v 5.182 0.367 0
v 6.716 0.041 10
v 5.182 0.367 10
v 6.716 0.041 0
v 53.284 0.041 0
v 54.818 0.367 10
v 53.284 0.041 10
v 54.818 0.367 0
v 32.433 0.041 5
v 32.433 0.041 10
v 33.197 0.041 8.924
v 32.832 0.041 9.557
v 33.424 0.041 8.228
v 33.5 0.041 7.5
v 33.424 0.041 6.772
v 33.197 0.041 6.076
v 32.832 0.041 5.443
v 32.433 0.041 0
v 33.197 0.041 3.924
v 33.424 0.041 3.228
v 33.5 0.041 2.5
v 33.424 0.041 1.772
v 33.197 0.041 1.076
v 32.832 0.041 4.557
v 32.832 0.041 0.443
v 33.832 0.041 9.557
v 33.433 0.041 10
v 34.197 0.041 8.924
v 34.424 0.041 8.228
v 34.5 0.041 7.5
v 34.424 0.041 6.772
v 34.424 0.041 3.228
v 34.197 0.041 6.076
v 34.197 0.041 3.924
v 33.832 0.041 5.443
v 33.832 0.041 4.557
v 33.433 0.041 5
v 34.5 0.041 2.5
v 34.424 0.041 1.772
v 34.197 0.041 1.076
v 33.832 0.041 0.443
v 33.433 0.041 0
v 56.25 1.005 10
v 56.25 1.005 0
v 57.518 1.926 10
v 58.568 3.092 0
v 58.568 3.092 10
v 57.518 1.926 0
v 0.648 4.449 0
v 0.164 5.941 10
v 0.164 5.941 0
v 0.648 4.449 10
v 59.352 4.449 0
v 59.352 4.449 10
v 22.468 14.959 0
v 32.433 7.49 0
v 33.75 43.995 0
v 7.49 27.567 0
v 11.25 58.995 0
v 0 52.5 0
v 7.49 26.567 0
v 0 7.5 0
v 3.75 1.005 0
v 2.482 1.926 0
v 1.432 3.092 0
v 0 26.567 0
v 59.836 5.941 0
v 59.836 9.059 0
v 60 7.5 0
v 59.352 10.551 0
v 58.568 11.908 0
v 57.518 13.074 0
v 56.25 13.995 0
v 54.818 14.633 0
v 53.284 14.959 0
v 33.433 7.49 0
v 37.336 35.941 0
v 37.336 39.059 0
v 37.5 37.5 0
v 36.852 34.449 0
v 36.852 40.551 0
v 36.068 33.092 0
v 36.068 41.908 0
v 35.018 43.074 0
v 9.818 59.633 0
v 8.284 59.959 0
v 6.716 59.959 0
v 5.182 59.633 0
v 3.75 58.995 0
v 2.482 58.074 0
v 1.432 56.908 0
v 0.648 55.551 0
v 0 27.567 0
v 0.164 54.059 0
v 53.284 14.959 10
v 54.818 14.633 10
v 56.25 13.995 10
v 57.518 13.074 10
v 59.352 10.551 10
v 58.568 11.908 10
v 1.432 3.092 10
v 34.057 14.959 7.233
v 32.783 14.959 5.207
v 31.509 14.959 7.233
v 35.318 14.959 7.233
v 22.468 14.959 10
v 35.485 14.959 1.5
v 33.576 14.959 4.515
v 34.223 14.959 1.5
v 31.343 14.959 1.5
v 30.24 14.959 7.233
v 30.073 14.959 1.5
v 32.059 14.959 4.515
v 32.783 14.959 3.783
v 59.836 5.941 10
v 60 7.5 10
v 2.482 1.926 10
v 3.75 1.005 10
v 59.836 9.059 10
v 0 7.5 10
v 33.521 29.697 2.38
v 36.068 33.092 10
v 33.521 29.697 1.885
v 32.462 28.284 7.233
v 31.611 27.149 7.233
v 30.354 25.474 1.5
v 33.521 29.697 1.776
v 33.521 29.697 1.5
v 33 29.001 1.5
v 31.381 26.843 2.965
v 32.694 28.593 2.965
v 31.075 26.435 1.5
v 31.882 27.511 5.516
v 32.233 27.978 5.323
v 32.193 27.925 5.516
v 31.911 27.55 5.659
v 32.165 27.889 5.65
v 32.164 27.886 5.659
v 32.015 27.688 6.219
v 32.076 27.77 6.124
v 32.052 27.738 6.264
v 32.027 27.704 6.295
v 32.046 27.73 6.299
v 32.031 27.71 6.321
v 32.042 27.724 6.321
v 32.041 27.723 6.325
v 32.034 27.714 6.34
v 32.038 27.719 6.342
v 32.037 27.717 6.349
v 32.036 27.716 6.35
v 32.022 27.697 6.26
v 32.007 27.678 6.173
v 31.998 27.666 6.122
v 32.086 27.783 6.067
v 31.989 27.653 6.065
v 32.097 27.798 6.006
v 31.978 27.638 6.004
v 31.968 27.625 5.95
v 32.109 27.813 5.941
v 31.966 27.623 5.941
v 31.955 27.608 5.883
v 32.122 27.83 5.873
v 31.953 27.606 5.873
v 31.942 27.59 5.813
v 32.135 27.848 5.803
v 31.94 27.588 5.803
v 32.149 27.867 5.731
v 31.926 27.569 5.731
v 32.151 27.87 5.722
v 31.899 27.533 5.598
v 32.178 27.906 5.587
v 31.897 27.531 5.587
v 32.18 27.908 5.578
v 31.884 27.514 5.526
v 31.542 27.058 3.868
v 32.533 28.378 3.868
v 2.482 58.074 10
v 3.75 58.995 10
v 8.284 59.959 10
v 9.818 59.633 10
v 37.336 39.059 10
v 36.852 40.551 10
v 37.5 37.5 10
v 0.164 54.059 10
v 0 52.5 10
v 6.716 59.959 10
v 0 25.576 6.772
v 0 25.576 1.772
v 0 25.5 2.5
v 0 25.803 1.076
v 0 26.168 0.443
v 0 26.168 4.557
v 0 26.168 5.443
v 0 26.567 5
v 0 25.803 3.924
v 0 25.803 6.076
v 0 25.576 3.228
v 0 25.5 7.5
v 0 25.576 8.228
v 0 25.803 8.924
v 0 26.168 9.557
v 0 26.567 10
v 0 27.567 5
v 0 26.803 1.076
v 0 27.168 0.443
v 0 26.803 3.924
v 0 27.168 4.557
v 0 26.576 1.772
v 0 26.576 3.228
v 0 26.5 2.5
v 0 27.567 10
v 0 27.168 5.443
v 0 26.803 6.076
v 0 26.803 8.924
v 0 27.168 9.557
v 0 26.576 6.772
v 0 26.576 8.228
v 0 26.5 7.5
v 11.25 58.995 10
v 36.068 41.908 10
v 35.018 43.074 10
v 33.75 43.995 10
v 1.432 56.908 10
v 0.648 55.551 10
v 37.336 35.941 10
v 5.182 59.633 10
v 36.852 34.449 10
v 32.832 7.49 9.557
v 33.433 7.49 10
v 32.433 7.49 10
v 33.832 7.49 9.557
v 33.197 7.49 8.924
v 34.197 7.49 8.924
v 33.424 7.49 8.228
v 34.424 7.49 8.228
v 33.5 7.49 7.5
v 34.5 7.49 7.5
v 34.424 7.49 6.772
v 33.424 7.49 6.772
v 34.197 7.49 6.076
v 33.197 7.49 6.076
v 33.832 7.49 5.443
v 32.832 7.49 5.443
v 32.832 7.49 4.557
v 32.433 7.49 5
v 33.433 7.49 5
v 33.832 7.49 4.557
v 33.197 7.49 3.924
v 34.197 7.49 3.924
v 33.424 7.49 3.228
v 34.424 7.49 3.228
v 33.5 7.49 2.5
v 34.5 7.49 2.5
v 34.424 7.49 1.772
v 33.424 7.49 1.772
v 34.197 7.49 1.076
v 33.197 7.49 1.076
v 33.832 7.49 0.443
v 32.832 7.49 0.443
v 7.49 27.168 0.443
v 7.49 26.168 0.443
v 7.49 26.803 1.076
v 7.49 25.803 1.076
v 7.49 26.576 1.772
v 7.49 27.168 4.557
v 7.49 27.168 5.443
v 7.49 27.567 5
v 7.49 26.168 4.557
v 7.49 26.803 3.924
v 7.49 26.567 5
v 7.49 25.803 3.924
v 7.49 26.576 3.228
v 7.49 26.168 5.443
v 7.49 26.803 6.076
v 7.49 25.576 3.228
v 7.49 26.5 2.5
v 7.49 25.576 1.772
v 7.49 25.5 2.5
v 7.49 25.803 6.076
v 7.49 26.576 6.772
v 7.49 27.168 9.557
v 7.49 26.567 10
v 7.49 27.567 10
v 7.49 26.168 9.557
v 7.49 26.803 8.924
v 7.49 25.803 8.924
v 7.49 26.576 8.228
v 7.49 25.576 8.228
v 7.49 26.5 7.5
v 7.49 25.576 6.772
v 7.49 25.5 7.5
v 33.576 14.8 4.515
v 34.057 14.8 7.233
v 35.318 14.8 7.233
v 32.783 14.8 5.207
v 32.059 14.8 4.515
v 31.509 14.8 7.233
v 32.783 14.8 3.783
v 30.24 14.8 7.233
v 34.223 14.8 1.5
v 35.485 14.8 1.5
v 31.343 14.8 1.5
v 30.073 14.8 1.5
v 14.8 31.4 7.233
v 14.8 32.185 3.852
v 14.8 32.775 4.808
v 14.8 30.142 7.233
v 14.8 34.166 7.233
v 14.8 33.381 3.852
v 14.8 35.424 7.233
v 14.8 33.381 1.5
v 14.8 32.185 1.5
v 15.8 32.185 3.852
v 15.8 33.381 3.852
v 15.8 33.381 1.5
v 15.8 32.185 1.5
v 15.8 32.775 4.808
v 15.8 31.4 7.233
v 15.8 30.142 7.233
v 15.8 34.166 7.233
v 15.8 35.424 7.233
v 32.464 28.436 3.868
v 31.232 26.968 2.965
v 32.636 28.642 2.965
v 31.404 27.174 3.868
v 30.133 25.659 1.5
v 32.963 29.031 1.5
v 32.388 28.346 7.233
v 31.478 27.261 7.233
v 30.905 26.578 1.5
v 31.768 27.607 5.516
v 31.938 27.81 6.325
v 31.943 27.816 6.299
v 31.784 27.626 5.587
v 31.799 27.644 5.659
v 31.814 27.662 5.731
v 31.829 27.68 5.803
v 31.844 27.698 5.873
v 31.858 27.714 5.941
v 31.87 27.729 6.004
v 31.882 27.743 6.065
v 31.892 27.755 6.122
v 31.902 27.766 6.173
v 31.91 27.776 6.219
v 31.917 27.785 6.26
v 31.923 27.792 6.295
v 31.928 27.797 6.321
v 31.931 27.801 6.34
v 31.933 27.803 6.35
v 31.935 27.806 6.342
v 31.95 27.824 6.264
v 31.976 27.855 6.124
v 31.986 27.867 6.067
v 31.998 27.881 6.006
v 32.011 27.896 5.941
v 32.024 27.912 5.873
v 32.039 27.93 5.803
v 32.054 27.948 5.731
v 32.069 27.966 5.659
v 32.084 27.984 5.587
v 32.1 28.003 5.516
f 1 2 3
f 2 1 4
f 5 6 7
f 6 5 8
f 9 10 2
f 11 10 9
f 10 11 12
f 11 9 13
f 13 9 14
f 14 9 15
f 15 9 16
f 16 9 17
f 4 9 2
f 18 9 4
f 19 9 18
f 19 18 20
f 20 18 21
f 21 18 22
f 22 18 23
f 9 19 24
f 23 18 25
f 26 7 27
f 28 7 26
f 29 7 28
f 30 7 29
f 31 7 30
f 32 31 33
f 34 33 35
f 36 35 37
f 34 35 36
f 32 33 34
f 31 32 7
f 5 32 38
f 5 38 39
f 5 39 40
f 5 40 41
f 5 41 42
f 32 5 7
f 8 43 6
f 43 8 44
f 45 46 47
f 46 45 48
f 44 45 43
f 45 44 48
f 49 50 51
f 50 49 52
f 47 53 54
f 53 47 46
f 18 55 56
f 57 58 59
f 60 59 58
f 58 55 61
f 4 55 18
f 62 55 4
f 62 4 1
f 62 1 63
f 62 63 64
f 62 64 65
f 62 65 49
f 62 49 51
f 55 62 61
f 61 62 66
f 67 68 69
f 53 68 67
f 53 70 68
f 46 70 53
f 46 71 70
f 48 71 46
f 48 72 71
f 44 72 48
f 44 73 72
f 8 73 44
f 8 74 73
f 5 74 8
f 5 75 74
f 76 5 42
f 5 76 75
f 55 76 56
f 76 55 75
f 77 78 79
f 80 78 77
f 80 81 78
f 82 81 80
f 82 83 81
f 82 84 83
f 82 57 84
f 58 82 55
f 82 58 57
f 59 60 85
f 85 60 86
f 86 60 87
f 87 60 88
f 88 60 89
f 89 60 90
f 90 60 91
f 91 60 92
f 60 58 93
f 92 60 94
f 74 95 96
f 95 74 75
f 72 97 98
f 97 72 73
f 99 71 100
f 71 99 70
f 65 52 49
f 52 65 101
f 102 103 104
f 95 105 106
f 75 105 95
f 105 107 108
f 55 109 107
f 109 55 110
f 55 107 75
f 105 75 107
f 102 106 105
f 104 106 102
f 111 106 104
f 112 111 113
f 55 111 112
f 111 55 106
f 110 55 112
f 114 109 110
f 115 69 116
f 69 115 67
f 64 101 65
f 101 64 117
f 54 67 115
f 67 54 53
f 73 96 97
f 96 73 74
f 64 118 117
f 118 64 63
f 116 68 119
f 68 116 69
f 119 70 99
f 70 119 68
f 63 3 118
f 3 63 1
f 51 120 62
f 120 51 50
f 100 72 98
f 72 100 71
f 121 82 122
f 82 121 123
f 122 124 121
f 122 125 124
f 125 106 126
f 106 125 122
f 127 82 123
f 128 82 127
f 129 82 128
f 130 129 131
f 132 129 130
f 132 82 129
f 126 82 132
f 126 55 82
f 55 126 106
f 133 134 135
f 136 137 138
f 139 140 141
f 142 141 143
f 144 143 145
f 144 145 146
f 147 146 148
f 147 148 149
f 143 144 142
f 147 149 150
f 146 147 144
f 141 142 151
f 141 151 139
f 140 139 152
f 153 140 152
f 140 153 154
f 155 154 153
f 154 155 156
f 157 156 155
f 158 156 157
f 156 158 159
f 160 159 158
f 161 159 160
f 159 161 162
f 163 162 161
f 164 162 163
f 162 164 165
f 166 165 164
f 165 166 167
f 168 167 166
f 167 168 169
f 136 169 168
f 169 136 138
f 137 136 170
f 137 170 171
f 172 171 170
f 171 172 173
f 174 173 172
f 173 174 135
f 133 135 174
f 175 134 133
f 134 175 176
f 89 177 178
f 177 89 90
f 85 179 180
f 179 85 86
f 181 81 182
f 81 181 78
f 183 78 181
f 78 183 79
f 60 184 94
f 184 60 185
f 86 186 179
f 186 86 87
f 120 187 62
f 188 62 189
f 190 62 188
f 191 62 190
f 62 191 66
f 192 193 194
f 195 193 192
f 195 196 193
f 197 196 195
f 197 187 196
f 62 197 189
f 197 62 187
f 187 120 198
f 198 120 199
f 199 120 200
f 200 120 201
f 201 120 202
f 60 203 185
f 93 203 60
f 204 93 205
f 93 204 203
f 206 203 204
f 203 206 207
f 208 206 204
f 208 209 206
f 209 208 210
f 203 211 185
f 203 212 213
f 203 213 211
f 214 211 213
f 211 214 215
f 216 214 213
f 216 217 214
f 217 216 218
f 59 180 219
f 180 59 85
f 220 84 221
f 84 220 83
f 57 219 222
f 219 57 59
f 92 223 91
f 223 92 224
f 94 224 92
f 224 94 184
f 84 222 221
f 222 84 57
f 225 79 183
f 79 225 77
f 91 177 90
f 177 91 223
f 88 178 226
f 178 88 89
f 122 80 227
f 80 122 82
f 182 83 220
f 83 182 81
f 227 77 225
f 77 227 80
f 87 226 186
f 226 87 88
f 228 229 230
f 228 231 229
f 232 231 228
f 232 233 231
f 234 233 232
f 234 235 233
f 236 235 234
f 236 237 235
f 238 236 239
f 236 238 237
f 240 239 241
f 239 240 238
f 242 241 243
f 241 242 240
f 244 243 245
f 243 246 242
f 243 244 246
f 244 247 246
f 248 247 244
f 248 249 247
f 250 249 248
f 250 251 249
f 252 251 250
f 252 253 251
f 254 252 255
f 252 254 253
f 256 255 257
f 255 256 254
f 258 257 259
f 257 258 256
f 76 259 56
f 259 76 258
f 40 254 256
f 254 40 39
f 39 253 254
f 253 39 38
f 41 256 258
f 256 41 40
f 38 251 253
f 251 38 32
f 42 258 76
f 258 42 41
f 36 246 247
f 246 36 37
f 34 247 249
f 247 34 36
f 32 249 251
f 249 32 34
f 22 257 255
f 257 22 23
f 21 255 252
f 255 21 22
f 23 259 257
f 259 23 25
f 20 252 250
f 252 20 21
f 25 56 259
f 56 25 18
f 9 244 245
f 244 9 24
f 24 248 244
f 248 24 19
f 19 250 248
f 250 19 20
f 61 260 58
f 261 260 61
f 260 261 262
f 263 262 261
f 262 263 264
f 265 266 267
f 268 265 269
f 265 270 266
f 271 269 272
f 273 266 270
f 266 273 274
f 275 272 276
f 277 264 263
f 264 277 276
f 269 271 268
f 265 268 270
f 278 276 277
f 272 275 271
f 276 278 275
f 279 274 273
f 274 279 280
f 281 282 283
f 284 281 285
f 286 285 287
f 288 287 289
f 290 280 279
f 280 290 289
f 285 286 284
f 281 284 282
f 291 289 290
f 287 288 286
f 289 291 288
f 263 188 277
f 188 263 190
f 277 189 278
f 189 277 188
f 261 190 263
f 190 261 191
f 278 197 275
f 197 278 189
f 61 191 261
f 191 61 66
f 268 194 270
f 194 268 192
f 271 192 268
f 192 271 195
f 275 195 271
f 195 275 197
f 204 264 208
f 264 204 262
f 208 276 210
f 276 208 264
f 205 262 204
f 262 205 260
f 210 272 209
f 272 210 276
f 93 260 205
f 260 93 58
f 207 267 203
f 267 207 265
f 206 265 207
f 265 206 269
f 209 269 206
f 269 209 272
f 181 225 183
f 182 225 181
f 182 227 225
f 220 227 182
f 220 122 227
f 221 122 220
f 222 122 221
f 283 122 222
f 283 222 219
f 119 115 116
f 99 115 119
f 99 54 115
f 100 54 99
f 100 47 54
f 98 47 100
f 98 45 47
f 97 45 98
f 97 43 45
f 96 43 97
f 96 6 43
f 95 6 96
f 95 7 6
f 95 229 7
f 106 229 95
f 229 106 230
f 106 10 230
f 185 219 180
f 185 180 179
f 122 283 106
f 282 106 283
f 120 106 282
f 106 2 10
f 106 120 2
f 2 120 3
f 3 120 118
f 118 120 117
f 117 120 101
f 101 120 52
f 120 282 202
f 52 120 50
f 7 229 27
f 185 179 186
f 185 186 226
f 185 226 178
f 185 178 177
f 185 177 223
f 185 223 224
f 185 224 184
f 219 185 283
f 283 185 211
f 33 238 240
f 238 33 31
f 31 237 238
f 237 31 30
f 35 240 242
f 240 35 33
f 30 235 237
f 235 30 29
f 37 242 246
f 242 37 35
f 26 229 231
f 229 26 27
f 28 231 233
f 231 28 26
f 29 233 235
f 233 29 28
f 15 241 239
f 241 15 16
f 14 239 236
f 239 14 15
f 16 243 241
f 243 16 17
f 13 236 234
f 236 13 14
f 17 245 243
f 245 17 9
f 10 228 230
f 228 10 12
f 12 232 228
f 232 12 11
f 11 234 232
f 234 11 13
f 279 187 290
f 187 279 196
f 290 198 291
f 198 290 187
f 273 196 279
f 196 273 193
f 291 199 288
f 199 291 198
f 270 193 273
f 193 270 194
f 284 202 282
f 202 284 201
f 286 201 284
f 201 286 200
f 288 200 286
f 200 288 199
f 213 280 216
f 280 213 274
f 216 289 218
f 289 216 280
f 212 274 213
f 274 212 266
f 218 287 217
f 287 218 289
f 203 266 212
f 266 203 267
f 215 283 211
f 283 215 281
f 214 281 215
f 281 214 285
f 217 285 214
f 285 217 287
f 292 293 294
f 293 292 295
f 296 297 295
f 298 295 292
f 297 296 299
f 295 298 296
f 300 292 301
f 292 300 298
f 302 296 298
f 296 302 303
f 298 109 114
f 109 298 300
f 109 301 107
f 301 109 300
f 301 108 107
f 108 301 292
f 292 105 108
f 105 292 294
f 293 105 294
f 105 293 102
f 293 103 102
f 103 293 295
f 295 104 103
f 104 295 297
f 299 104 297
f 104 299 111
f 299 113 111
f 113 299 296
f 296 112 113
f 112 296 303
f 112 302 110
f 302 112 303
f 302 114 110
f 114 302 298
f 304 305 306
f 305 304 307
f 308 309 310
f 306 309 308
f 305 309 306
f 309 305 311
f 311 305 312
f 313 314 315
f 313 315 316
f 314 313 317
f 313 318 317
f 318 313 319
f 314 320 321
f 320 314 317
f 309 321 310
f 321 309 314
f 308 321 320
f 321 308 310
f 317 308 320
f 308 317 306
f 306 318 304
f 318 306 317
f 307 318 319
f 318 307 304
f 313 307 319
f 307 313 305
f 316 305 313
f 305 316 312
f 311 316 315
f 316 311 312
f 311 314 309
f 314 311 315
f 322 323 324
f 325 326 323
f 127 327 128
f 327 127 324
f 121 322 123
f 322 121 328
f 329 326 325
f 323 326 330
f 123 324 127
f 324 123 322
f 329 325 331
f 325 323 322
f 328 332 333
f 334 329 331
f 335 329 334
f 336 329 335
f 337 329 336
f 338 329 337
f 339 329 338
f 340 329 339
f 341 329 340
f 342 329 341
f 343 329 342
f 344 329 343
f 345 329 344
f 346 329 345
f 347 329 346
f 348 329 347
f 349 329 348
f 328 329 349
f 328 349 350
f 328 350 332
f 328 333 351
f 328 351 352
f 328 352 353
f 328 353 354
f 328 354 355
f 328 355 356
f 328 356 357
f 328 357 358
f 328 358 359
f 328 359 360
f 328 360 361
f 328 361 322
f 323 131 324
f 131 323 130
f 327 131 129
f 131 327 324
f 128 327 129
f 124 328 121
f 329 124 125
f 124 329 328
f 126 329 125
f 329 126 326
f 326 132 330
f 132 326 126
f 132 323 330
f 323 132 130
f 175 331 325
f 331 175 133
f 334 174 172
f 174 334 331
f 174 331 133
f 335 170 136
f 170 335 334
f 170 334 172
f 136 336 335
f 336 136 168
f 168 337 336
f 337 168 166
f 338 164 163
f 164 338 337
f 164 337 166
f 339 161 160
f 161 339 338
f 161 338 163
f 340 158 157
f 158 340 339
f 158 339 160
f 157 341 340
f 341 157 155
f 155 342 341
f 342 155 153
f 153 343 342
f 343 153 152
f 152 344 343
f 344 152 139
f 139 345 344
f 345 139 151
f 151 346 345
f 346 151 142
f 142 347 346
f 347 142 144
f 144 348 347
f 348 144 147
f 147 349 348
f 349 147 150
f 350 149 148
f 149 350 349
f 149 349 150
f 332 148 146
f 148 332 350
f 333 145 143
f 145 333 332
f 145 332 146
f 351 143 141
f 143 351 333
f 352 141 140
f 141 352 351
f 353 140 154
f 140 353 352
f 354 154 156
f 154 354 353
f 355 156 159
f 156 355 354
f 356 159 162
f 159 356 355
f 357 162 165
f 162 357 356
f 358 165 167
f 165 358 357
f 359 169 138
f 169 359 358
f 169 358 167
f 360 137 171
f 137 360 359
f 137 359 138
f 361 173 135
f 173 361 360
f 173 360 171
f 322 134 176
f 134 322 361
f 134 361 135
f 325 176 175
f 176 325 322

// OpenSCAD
$fs=0.2;

s = 60;
w = 15;
h = 5;
num_sections=2;
letter_size = 6;
square=0;
type = 2;
notch=2;

tower();

module tower(){
    difference(){
        for(i=[0:num_sections-1]){
            translate([0,0,h*i])
            if(type == 1){
                section1();
            }else{
                section2();
            }
        }    
        /*  X axis */
        translate([s/2, w+1-.2, 1.5])
        rotate([90,0,0])
        linear_extrude(height = 1)
        text("X", size = letter_size, font="Arial:style=Bold");
        //  Y axis
        translate([w-.2, s/2, 1.5])
        rotate([90,0,90])
        linear_extrude(height = 1)
        text("Y", size = letter_size, font="Arial:style=Bold");
        /*  A */
        translate([s/2,s/2-4.5,1.5])
        rotate([90,0,50])
        linear_extrude(height = 1)
        text("A", size = letter_size, font="Arial:style=Bold");
    }
}

module section1(){
    difference(){
        union(){
            if(square){
                hull(){
                    cube([w,w,h]);    
                    translate([s-w,0,0])
                    cube([w,w,h]);    
                }
                hull(){
                    cube([w,w,h]);    
                    translate([0,s-w,0])
                    cube([w,w,h]);    
                }                
            }else{
                hull(){
                    translate([w/2,w/2,0])
                    cylinder(d=w,h=h);    
                    translate([s-w/2,w/2,0])
                    cylinder(d=w,h=h);
                }
                hull(){
                    translate([w/2,w/2,0])
                    cylinder(d=w,h=h);    
                    translate([w/2,s-w/2,0])
                    cylinder(d=w,h=h);
                }
            }

            translate([w/2,w/2,0])
            cube([w,w,h]);           
        }
        

        //========================
        translate([w*1.5,w*1.5,-1])
        cylinder(d=w,h=h+2);
        
        // X axis
        translate([s/4, -.01,-.5])
        notch(1,w/2);
        translate([s/3*2, -.01,-.5])
        notch(2, w/2);
        
        // Y axis
        translate([-.01, s/4*3,-.5])
        rotate([0,0,-90])
        notch(1, w/2);
        translate([-.01, s/3,-.5])
        rotate([0,0,-90])
        notch(2, w/2);
    }
}

module section2(){
    difference(){
        union(){
            if(square){
                hull(){
                    cube([w,w,h]);    
                    translate([s-w,0,0])
                    cube([w,w,h]);    
                }
                hull(){
                    cube([w,w,h]);    
                    translate([0,s-w,0])
                    cube([w,w,h]);    
                }                
            }else{
                hull(){
                    translate([w/2,w/2,0])
                    cylinder(d=w,h=h);    
                    translate([s-w/2,w/2,0])
                    cylinder(d=w,h=h);
                }
                hull(){
                    translate([w/2,w/2,0])
                    cylinder(d=w,h=h);    
                    translate([w/2,s-w/2,0])
                    cylinder(d=w,h=h);

                    translate([s/2,s/2+w/2,0])
                    cylinder(d=w,h=h);
                }
            }
        }
        

        //========================
        
        if(notch==1){
            // X axis
            translate([s/4, -.01,-.5])
            notch(1,w/2);
            translate([s/3*2, -.01,-.5])
            notch(2, w/2);
            
            // Y axis
            translate([-.01, s/4*3,-.5])
            rotate([0,0,-90])
            notch(1, w/2);
            translate([-.01, s/3,-.5])
            rotate([0,0,-90])
            notch(2, w/2);
        }else if(notch==2){
            // X axis
            translate([s/2, -.01,-.5])
            notch(1,w/2);
            // Y axis
            translate([-.01, s/2,-.5])
            rotate([0,0,-90])
            notch(1, w/2);
        }
    }
}

module notch(w, d){
    difference(){
        union(){
            cube([w,d,h+2]);
            
            translate([w,0,h/2+.5])
            rotate([-90,0,0])
            cylinder(d=h+2, h=d);                
        }
        
        translate([0,0,h/2+.5])
        rotate([-90,0,0])
        cylinder(d=h+2, h=d);
    }
}    
